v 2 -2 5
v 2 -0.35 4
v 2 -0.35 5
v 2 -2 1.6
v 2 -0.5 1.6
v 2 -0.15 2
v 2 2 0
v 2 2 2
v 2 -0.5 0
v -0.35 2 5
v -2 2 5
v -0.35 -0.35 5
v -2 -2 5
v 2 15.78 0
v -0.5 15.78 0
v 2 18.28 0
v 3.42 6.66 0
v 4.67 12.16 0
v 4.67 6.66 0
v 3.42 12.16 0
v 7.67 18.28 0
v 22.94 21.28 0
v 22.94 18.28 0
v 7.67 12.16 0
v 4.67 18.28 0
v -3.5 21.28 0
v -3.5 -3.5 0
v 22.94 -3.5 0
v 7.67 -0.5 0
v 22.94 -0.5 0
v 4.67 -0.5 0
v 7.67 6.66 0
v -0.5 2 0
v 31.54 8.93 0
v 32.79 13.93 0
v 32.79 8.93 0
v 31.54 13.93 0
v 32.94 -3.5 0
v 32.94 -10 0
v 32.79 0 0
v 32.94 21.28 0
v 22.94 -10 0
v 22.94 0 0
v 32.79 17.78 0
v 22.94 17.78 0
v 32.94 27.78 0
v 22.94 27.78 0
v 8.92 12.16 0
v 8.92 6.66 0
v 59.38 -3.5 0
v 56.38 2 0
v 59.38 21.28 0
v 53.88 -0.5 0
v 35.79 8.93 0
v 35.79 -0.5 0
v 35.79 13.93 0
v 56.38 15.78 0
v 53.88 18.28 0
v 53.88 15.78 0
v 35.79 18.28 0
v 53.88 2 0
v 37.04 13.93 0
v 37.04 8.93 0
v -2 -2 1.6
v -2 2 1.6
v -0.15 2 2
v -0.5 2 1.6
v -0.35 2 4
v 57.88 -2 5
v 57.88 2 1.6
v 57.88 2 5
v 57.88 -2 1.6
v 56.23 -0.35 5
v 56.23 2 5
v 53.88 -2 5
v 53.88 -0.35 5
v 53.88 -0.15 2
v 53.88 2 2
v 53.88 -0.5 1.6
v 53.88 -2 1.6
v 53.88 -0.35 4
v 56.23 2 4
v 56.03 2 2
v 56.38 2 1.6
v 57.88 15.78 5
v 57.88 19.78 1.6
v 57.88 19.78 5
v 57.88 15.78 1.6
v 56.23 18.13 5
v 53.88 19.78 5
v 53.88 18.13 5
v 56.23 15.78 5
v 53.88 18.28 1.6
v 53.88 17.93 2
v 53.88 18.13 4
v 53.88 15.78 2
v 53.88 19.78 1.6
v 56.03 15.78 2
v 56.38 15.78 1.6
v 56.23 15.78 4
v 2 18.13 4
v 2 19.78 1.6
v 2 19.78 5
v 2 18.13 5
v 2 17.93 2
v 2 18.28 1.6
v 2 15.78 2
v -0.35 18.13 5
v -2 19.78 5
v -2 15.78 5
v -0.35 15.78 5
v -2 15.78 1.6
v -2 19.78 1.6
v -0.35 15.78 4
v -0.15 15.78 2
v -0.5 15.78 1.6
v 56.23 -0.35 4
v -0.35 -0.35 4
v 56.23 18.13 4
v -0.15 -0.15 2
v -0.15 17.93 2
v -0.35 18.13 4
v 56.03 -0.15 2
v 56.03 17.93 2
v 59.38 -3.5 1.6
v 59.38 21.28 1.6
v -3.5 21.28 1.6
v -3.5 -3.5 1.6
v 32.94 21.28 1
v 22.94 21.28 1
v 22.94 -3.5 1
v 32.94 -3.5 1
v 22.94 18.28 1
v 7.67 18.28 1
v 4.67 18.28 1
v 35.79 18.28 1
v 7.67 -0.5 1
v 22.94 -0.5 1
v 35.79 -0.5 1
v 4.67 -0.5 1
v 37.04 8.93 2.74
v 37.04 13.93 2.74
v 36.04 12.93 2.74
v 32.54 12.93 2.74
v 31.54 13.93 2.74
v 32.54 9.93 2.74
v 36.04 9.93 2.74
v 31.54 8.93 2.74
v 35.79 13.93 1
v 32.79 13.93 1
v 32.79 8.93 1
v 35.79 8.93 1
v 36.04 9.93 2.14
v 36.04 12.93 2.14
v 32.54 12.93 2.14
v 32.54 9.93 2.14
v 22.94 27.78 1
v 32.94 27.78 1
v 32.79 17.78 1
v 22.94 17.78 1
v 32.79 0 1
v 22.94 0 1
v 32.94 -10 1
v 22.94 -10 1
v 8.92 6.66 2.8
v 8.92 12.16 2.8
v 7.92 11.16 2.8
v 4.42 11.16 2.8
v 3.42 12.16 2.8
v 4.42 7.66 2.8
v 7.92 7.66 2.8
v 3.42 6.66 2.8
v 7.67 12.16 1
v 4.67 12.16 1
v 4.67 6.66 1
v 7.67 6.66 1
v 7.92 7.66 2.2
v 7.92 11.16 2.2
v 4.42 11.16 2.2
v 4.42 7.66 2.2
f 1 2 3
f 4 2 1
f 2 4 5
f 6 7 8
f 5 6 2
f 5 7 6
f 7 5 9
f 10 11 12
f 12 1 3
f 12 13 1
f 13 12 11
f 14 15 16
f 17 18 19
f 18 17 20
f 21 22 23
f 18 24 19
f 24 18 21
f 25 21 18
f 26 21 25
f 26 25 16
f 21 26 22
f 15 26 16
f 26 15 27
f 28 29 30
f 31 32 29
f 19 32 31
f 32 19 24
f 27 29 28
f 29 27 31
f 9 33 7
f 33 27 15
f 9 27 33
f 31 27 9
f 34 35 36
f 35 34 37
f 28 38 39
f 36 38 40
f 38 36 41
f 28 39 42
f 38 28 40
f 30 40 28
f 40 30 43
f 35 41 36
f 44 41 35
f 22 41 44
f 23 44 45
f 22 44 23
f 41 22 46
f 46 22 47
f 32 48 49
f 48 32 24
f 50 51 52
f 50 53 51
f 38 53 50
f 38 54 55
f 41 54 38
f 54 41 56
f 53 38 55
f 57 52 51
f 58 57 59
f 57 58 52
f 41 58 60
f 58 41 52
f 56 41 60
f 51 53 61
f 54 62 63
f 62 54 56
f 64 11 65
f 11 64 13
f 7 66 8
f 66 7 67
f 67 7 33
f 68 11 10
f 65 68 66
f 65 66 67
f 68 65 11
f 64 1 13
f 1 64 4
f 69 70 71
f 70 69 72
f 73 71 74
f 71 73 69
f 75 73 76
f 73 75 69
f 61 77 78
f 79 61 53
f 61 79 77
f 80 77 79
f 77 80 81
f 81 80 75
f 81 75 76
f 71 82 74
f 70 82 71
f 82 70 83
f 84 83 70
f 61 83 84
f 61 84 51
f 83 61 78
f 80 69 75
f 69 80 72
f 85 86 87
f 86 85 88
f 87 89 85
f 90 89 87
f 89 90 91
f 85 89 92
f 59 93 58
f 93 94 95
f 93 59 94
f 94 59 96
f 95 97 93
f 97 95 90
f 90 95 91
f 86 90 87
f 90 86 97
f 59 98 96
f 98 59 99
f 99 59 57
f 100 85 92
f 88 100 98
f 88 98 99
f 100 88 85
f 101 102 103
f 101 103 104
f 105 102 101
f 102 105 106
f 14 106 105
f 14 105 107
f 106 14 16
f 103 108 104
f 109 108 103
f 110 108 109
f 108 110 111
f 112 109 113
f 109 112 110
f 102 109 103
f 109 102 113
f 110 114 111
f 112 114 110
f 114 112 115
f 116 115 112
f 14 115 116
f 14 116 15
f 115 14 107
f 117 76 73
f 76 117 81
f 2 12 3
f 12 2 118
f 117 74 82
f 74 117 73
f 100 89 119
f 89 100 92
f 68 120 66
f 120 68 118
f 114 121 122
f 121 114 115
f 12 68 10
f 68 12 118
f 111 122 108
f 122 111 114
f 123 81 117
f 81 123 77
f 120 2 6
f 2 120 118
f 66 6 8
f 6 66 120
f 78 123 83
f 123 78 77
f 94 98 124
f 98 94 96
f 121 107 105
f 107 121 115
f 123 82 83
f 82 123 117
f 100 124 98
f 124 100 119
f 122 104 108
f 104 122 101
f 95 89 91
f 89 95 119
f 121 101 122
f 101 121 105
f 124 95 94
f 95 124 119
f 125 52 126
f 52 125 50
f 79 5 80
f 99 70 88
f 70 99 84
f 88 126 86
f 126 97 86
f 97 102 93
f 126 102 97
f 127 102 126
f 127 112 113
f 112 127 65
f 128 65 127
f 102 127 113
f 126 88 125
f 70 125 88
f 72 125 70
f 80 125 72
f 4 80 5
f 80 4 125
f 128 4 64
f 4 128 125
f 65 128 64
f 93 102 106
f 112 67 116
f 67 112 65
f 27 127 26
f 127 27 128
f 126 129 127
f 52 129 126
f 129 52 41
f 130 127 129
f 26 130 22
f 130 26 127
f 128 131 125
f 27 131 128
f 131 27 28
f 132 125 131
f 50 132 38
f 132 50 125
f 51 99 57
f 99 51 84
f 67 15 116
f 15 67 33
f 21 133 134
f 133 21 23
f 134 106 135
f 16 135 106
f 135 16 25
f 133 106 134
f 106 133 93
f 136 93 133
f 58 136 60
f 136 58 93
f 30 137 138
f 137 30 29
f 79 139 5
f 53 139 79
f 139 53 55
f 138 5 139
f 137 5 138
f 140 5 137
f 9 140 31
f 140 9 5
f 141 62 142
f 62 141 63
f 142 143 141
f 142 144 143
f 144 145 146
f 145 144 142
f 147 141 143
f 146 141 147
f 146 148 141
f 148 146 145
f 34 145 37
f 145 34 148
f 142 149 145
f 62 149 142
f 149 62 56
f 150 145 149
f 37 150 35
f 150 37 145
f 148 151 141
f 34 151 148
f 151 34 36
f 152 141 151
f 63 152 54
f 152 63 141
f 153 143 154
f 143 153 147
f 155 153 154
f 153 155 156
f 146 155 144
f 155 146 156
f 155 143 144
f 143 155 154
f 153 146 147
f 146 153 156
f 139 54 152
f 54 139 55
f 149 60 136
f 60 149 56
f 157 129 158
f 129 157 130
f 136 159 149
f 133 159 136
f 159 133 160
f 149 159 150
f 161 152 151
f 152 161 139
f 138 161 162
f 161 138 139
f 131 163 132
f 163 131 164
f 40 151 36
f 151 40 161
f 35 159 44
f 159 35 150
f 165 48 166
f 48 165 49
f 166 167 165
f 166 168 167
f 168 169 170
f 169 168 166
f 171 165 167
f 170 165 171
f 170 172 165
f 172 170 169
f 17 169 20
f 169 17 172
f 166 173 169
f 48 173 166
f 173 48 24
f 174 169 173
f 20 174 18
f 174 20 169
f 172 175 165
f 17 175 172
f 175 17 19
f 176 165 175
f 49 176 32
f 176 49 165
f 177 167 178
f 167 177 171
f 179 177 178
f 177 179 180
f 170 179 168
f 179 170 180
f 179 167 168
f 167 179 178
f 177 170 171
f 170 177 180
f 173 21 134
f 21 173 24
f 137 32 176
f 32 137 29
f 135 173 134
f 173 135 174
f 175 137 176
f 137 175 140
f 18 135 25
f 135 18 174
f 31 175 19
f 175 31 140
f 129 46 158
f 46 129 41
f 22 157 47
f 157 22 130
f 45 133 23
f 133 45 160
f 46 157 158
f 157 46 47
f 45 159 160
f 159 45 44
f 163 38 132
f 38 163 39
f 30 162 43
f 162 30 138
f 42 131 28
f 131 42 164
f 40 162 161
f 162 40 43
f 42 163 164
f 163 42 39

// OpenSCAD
INCH_TO_MM = 25.4;

// Offset from the origin (0,0) to the lower left of the board. Typically 1/2 of 1/10 of an inch
ORIGIN = 0.05 * INCH_TO_MM;
// Size of the board
DX = (2.15 + 0.05) * INCH_TO_MM;
DY = (0.65 + 0.05) * INCH_TO_MM;

PILLAR = 4.0;
PILLAR_Z = 5.0;
BASE = 2.0;
TARGET = 3.0;
SUPPORT_HEIGHT = 1.0;
EDGE = 0.6;

TRIM = 0.5;
EPS = 0.001;
STRUCTURE = 3.0;
HANDLE = 10.0;

ZSTRUCT = 1.0;
ZSTRUCT_OUTER = 1.6;

module pillar() {
    translate([-PILLAR/2, -PILLAR/2, 0])
        cube(size=[PILLAR, PILLAR, PILLAR_Z]);
}

module support(x, y, sx, sy, height) {
    x = x + ORIGIN;
    y = DY - (y + ORIGIN);

    echo("support at:", x, y, "size:", sx, sy);

    T = 1.0;
    difference() {
        translate([x - sx/2 - T, y - sy/2 - T, 0]) 
            cube(size=[sx + 2*T, sy + 2*T, TARGET - height + EDGE]);
        translate([x - sx/2, y - sy/2, TARGET - height])
            cube(size=[sx, sy, 10.0]);
    }
    translate([x - STRUCTURE/2, -1, 0])
        cube(size=[STRUCTURE, DY + 2, ZSTRUCT]);
}

{
    difference() {
        union() {
            pillar();
            translate([DX, 0, 0]) pillar();
            translate([DX, DY, 0]) pillar();
            translate([0, DY, 0]) pillar();
        }
        T = 0.15;
        T1 = 0.35;
        hull() {
            translate([-T, -T, BASE])
                cube(size=[DX + T*2, DY + T*2, 10]);
            translate([-T1, -T1, PILLAR])
                cube(size=[DX + T1*2, DY + T1*2, 10]);
        }
    }

    OUT = 3.5;
    OUT0 = 0.5;

    // Base
    difference() {
        translate([-OUT, -OUT, 0])
            cube(size=[DX + OUT*2, DY + OUT*2, ZSTRUCT_OUTER]);
        translate([-OUT0, -OUT0, -EPS]) 
            cube(size=[DX+OUT0*2, DY+OUT0*2, 100]);
    }

    // Finger holds
    translate([DX/2 - HANDLE/2, DY, 0]) cube(size=[HANDLE, HANDLE, ZSTRUCT]);
    translate([DX/2 - HANDLE/2, -HANDLE, 0]) cube(size=[HANDLE, HANDLE, ZSTRUCT]);

    // Itsy V4 accel
    support(1.3*INCH_TO_MM, 0.2*INCH_TO_MM, 3.00 + TRIM, 2.50 + TRIM, 0.86);

    // Itsy V2/V3/V4 audio amp
    support(4.9, 7.1, 3.00 + TRIM, 3.00 + TRIM, 0.8);
}
